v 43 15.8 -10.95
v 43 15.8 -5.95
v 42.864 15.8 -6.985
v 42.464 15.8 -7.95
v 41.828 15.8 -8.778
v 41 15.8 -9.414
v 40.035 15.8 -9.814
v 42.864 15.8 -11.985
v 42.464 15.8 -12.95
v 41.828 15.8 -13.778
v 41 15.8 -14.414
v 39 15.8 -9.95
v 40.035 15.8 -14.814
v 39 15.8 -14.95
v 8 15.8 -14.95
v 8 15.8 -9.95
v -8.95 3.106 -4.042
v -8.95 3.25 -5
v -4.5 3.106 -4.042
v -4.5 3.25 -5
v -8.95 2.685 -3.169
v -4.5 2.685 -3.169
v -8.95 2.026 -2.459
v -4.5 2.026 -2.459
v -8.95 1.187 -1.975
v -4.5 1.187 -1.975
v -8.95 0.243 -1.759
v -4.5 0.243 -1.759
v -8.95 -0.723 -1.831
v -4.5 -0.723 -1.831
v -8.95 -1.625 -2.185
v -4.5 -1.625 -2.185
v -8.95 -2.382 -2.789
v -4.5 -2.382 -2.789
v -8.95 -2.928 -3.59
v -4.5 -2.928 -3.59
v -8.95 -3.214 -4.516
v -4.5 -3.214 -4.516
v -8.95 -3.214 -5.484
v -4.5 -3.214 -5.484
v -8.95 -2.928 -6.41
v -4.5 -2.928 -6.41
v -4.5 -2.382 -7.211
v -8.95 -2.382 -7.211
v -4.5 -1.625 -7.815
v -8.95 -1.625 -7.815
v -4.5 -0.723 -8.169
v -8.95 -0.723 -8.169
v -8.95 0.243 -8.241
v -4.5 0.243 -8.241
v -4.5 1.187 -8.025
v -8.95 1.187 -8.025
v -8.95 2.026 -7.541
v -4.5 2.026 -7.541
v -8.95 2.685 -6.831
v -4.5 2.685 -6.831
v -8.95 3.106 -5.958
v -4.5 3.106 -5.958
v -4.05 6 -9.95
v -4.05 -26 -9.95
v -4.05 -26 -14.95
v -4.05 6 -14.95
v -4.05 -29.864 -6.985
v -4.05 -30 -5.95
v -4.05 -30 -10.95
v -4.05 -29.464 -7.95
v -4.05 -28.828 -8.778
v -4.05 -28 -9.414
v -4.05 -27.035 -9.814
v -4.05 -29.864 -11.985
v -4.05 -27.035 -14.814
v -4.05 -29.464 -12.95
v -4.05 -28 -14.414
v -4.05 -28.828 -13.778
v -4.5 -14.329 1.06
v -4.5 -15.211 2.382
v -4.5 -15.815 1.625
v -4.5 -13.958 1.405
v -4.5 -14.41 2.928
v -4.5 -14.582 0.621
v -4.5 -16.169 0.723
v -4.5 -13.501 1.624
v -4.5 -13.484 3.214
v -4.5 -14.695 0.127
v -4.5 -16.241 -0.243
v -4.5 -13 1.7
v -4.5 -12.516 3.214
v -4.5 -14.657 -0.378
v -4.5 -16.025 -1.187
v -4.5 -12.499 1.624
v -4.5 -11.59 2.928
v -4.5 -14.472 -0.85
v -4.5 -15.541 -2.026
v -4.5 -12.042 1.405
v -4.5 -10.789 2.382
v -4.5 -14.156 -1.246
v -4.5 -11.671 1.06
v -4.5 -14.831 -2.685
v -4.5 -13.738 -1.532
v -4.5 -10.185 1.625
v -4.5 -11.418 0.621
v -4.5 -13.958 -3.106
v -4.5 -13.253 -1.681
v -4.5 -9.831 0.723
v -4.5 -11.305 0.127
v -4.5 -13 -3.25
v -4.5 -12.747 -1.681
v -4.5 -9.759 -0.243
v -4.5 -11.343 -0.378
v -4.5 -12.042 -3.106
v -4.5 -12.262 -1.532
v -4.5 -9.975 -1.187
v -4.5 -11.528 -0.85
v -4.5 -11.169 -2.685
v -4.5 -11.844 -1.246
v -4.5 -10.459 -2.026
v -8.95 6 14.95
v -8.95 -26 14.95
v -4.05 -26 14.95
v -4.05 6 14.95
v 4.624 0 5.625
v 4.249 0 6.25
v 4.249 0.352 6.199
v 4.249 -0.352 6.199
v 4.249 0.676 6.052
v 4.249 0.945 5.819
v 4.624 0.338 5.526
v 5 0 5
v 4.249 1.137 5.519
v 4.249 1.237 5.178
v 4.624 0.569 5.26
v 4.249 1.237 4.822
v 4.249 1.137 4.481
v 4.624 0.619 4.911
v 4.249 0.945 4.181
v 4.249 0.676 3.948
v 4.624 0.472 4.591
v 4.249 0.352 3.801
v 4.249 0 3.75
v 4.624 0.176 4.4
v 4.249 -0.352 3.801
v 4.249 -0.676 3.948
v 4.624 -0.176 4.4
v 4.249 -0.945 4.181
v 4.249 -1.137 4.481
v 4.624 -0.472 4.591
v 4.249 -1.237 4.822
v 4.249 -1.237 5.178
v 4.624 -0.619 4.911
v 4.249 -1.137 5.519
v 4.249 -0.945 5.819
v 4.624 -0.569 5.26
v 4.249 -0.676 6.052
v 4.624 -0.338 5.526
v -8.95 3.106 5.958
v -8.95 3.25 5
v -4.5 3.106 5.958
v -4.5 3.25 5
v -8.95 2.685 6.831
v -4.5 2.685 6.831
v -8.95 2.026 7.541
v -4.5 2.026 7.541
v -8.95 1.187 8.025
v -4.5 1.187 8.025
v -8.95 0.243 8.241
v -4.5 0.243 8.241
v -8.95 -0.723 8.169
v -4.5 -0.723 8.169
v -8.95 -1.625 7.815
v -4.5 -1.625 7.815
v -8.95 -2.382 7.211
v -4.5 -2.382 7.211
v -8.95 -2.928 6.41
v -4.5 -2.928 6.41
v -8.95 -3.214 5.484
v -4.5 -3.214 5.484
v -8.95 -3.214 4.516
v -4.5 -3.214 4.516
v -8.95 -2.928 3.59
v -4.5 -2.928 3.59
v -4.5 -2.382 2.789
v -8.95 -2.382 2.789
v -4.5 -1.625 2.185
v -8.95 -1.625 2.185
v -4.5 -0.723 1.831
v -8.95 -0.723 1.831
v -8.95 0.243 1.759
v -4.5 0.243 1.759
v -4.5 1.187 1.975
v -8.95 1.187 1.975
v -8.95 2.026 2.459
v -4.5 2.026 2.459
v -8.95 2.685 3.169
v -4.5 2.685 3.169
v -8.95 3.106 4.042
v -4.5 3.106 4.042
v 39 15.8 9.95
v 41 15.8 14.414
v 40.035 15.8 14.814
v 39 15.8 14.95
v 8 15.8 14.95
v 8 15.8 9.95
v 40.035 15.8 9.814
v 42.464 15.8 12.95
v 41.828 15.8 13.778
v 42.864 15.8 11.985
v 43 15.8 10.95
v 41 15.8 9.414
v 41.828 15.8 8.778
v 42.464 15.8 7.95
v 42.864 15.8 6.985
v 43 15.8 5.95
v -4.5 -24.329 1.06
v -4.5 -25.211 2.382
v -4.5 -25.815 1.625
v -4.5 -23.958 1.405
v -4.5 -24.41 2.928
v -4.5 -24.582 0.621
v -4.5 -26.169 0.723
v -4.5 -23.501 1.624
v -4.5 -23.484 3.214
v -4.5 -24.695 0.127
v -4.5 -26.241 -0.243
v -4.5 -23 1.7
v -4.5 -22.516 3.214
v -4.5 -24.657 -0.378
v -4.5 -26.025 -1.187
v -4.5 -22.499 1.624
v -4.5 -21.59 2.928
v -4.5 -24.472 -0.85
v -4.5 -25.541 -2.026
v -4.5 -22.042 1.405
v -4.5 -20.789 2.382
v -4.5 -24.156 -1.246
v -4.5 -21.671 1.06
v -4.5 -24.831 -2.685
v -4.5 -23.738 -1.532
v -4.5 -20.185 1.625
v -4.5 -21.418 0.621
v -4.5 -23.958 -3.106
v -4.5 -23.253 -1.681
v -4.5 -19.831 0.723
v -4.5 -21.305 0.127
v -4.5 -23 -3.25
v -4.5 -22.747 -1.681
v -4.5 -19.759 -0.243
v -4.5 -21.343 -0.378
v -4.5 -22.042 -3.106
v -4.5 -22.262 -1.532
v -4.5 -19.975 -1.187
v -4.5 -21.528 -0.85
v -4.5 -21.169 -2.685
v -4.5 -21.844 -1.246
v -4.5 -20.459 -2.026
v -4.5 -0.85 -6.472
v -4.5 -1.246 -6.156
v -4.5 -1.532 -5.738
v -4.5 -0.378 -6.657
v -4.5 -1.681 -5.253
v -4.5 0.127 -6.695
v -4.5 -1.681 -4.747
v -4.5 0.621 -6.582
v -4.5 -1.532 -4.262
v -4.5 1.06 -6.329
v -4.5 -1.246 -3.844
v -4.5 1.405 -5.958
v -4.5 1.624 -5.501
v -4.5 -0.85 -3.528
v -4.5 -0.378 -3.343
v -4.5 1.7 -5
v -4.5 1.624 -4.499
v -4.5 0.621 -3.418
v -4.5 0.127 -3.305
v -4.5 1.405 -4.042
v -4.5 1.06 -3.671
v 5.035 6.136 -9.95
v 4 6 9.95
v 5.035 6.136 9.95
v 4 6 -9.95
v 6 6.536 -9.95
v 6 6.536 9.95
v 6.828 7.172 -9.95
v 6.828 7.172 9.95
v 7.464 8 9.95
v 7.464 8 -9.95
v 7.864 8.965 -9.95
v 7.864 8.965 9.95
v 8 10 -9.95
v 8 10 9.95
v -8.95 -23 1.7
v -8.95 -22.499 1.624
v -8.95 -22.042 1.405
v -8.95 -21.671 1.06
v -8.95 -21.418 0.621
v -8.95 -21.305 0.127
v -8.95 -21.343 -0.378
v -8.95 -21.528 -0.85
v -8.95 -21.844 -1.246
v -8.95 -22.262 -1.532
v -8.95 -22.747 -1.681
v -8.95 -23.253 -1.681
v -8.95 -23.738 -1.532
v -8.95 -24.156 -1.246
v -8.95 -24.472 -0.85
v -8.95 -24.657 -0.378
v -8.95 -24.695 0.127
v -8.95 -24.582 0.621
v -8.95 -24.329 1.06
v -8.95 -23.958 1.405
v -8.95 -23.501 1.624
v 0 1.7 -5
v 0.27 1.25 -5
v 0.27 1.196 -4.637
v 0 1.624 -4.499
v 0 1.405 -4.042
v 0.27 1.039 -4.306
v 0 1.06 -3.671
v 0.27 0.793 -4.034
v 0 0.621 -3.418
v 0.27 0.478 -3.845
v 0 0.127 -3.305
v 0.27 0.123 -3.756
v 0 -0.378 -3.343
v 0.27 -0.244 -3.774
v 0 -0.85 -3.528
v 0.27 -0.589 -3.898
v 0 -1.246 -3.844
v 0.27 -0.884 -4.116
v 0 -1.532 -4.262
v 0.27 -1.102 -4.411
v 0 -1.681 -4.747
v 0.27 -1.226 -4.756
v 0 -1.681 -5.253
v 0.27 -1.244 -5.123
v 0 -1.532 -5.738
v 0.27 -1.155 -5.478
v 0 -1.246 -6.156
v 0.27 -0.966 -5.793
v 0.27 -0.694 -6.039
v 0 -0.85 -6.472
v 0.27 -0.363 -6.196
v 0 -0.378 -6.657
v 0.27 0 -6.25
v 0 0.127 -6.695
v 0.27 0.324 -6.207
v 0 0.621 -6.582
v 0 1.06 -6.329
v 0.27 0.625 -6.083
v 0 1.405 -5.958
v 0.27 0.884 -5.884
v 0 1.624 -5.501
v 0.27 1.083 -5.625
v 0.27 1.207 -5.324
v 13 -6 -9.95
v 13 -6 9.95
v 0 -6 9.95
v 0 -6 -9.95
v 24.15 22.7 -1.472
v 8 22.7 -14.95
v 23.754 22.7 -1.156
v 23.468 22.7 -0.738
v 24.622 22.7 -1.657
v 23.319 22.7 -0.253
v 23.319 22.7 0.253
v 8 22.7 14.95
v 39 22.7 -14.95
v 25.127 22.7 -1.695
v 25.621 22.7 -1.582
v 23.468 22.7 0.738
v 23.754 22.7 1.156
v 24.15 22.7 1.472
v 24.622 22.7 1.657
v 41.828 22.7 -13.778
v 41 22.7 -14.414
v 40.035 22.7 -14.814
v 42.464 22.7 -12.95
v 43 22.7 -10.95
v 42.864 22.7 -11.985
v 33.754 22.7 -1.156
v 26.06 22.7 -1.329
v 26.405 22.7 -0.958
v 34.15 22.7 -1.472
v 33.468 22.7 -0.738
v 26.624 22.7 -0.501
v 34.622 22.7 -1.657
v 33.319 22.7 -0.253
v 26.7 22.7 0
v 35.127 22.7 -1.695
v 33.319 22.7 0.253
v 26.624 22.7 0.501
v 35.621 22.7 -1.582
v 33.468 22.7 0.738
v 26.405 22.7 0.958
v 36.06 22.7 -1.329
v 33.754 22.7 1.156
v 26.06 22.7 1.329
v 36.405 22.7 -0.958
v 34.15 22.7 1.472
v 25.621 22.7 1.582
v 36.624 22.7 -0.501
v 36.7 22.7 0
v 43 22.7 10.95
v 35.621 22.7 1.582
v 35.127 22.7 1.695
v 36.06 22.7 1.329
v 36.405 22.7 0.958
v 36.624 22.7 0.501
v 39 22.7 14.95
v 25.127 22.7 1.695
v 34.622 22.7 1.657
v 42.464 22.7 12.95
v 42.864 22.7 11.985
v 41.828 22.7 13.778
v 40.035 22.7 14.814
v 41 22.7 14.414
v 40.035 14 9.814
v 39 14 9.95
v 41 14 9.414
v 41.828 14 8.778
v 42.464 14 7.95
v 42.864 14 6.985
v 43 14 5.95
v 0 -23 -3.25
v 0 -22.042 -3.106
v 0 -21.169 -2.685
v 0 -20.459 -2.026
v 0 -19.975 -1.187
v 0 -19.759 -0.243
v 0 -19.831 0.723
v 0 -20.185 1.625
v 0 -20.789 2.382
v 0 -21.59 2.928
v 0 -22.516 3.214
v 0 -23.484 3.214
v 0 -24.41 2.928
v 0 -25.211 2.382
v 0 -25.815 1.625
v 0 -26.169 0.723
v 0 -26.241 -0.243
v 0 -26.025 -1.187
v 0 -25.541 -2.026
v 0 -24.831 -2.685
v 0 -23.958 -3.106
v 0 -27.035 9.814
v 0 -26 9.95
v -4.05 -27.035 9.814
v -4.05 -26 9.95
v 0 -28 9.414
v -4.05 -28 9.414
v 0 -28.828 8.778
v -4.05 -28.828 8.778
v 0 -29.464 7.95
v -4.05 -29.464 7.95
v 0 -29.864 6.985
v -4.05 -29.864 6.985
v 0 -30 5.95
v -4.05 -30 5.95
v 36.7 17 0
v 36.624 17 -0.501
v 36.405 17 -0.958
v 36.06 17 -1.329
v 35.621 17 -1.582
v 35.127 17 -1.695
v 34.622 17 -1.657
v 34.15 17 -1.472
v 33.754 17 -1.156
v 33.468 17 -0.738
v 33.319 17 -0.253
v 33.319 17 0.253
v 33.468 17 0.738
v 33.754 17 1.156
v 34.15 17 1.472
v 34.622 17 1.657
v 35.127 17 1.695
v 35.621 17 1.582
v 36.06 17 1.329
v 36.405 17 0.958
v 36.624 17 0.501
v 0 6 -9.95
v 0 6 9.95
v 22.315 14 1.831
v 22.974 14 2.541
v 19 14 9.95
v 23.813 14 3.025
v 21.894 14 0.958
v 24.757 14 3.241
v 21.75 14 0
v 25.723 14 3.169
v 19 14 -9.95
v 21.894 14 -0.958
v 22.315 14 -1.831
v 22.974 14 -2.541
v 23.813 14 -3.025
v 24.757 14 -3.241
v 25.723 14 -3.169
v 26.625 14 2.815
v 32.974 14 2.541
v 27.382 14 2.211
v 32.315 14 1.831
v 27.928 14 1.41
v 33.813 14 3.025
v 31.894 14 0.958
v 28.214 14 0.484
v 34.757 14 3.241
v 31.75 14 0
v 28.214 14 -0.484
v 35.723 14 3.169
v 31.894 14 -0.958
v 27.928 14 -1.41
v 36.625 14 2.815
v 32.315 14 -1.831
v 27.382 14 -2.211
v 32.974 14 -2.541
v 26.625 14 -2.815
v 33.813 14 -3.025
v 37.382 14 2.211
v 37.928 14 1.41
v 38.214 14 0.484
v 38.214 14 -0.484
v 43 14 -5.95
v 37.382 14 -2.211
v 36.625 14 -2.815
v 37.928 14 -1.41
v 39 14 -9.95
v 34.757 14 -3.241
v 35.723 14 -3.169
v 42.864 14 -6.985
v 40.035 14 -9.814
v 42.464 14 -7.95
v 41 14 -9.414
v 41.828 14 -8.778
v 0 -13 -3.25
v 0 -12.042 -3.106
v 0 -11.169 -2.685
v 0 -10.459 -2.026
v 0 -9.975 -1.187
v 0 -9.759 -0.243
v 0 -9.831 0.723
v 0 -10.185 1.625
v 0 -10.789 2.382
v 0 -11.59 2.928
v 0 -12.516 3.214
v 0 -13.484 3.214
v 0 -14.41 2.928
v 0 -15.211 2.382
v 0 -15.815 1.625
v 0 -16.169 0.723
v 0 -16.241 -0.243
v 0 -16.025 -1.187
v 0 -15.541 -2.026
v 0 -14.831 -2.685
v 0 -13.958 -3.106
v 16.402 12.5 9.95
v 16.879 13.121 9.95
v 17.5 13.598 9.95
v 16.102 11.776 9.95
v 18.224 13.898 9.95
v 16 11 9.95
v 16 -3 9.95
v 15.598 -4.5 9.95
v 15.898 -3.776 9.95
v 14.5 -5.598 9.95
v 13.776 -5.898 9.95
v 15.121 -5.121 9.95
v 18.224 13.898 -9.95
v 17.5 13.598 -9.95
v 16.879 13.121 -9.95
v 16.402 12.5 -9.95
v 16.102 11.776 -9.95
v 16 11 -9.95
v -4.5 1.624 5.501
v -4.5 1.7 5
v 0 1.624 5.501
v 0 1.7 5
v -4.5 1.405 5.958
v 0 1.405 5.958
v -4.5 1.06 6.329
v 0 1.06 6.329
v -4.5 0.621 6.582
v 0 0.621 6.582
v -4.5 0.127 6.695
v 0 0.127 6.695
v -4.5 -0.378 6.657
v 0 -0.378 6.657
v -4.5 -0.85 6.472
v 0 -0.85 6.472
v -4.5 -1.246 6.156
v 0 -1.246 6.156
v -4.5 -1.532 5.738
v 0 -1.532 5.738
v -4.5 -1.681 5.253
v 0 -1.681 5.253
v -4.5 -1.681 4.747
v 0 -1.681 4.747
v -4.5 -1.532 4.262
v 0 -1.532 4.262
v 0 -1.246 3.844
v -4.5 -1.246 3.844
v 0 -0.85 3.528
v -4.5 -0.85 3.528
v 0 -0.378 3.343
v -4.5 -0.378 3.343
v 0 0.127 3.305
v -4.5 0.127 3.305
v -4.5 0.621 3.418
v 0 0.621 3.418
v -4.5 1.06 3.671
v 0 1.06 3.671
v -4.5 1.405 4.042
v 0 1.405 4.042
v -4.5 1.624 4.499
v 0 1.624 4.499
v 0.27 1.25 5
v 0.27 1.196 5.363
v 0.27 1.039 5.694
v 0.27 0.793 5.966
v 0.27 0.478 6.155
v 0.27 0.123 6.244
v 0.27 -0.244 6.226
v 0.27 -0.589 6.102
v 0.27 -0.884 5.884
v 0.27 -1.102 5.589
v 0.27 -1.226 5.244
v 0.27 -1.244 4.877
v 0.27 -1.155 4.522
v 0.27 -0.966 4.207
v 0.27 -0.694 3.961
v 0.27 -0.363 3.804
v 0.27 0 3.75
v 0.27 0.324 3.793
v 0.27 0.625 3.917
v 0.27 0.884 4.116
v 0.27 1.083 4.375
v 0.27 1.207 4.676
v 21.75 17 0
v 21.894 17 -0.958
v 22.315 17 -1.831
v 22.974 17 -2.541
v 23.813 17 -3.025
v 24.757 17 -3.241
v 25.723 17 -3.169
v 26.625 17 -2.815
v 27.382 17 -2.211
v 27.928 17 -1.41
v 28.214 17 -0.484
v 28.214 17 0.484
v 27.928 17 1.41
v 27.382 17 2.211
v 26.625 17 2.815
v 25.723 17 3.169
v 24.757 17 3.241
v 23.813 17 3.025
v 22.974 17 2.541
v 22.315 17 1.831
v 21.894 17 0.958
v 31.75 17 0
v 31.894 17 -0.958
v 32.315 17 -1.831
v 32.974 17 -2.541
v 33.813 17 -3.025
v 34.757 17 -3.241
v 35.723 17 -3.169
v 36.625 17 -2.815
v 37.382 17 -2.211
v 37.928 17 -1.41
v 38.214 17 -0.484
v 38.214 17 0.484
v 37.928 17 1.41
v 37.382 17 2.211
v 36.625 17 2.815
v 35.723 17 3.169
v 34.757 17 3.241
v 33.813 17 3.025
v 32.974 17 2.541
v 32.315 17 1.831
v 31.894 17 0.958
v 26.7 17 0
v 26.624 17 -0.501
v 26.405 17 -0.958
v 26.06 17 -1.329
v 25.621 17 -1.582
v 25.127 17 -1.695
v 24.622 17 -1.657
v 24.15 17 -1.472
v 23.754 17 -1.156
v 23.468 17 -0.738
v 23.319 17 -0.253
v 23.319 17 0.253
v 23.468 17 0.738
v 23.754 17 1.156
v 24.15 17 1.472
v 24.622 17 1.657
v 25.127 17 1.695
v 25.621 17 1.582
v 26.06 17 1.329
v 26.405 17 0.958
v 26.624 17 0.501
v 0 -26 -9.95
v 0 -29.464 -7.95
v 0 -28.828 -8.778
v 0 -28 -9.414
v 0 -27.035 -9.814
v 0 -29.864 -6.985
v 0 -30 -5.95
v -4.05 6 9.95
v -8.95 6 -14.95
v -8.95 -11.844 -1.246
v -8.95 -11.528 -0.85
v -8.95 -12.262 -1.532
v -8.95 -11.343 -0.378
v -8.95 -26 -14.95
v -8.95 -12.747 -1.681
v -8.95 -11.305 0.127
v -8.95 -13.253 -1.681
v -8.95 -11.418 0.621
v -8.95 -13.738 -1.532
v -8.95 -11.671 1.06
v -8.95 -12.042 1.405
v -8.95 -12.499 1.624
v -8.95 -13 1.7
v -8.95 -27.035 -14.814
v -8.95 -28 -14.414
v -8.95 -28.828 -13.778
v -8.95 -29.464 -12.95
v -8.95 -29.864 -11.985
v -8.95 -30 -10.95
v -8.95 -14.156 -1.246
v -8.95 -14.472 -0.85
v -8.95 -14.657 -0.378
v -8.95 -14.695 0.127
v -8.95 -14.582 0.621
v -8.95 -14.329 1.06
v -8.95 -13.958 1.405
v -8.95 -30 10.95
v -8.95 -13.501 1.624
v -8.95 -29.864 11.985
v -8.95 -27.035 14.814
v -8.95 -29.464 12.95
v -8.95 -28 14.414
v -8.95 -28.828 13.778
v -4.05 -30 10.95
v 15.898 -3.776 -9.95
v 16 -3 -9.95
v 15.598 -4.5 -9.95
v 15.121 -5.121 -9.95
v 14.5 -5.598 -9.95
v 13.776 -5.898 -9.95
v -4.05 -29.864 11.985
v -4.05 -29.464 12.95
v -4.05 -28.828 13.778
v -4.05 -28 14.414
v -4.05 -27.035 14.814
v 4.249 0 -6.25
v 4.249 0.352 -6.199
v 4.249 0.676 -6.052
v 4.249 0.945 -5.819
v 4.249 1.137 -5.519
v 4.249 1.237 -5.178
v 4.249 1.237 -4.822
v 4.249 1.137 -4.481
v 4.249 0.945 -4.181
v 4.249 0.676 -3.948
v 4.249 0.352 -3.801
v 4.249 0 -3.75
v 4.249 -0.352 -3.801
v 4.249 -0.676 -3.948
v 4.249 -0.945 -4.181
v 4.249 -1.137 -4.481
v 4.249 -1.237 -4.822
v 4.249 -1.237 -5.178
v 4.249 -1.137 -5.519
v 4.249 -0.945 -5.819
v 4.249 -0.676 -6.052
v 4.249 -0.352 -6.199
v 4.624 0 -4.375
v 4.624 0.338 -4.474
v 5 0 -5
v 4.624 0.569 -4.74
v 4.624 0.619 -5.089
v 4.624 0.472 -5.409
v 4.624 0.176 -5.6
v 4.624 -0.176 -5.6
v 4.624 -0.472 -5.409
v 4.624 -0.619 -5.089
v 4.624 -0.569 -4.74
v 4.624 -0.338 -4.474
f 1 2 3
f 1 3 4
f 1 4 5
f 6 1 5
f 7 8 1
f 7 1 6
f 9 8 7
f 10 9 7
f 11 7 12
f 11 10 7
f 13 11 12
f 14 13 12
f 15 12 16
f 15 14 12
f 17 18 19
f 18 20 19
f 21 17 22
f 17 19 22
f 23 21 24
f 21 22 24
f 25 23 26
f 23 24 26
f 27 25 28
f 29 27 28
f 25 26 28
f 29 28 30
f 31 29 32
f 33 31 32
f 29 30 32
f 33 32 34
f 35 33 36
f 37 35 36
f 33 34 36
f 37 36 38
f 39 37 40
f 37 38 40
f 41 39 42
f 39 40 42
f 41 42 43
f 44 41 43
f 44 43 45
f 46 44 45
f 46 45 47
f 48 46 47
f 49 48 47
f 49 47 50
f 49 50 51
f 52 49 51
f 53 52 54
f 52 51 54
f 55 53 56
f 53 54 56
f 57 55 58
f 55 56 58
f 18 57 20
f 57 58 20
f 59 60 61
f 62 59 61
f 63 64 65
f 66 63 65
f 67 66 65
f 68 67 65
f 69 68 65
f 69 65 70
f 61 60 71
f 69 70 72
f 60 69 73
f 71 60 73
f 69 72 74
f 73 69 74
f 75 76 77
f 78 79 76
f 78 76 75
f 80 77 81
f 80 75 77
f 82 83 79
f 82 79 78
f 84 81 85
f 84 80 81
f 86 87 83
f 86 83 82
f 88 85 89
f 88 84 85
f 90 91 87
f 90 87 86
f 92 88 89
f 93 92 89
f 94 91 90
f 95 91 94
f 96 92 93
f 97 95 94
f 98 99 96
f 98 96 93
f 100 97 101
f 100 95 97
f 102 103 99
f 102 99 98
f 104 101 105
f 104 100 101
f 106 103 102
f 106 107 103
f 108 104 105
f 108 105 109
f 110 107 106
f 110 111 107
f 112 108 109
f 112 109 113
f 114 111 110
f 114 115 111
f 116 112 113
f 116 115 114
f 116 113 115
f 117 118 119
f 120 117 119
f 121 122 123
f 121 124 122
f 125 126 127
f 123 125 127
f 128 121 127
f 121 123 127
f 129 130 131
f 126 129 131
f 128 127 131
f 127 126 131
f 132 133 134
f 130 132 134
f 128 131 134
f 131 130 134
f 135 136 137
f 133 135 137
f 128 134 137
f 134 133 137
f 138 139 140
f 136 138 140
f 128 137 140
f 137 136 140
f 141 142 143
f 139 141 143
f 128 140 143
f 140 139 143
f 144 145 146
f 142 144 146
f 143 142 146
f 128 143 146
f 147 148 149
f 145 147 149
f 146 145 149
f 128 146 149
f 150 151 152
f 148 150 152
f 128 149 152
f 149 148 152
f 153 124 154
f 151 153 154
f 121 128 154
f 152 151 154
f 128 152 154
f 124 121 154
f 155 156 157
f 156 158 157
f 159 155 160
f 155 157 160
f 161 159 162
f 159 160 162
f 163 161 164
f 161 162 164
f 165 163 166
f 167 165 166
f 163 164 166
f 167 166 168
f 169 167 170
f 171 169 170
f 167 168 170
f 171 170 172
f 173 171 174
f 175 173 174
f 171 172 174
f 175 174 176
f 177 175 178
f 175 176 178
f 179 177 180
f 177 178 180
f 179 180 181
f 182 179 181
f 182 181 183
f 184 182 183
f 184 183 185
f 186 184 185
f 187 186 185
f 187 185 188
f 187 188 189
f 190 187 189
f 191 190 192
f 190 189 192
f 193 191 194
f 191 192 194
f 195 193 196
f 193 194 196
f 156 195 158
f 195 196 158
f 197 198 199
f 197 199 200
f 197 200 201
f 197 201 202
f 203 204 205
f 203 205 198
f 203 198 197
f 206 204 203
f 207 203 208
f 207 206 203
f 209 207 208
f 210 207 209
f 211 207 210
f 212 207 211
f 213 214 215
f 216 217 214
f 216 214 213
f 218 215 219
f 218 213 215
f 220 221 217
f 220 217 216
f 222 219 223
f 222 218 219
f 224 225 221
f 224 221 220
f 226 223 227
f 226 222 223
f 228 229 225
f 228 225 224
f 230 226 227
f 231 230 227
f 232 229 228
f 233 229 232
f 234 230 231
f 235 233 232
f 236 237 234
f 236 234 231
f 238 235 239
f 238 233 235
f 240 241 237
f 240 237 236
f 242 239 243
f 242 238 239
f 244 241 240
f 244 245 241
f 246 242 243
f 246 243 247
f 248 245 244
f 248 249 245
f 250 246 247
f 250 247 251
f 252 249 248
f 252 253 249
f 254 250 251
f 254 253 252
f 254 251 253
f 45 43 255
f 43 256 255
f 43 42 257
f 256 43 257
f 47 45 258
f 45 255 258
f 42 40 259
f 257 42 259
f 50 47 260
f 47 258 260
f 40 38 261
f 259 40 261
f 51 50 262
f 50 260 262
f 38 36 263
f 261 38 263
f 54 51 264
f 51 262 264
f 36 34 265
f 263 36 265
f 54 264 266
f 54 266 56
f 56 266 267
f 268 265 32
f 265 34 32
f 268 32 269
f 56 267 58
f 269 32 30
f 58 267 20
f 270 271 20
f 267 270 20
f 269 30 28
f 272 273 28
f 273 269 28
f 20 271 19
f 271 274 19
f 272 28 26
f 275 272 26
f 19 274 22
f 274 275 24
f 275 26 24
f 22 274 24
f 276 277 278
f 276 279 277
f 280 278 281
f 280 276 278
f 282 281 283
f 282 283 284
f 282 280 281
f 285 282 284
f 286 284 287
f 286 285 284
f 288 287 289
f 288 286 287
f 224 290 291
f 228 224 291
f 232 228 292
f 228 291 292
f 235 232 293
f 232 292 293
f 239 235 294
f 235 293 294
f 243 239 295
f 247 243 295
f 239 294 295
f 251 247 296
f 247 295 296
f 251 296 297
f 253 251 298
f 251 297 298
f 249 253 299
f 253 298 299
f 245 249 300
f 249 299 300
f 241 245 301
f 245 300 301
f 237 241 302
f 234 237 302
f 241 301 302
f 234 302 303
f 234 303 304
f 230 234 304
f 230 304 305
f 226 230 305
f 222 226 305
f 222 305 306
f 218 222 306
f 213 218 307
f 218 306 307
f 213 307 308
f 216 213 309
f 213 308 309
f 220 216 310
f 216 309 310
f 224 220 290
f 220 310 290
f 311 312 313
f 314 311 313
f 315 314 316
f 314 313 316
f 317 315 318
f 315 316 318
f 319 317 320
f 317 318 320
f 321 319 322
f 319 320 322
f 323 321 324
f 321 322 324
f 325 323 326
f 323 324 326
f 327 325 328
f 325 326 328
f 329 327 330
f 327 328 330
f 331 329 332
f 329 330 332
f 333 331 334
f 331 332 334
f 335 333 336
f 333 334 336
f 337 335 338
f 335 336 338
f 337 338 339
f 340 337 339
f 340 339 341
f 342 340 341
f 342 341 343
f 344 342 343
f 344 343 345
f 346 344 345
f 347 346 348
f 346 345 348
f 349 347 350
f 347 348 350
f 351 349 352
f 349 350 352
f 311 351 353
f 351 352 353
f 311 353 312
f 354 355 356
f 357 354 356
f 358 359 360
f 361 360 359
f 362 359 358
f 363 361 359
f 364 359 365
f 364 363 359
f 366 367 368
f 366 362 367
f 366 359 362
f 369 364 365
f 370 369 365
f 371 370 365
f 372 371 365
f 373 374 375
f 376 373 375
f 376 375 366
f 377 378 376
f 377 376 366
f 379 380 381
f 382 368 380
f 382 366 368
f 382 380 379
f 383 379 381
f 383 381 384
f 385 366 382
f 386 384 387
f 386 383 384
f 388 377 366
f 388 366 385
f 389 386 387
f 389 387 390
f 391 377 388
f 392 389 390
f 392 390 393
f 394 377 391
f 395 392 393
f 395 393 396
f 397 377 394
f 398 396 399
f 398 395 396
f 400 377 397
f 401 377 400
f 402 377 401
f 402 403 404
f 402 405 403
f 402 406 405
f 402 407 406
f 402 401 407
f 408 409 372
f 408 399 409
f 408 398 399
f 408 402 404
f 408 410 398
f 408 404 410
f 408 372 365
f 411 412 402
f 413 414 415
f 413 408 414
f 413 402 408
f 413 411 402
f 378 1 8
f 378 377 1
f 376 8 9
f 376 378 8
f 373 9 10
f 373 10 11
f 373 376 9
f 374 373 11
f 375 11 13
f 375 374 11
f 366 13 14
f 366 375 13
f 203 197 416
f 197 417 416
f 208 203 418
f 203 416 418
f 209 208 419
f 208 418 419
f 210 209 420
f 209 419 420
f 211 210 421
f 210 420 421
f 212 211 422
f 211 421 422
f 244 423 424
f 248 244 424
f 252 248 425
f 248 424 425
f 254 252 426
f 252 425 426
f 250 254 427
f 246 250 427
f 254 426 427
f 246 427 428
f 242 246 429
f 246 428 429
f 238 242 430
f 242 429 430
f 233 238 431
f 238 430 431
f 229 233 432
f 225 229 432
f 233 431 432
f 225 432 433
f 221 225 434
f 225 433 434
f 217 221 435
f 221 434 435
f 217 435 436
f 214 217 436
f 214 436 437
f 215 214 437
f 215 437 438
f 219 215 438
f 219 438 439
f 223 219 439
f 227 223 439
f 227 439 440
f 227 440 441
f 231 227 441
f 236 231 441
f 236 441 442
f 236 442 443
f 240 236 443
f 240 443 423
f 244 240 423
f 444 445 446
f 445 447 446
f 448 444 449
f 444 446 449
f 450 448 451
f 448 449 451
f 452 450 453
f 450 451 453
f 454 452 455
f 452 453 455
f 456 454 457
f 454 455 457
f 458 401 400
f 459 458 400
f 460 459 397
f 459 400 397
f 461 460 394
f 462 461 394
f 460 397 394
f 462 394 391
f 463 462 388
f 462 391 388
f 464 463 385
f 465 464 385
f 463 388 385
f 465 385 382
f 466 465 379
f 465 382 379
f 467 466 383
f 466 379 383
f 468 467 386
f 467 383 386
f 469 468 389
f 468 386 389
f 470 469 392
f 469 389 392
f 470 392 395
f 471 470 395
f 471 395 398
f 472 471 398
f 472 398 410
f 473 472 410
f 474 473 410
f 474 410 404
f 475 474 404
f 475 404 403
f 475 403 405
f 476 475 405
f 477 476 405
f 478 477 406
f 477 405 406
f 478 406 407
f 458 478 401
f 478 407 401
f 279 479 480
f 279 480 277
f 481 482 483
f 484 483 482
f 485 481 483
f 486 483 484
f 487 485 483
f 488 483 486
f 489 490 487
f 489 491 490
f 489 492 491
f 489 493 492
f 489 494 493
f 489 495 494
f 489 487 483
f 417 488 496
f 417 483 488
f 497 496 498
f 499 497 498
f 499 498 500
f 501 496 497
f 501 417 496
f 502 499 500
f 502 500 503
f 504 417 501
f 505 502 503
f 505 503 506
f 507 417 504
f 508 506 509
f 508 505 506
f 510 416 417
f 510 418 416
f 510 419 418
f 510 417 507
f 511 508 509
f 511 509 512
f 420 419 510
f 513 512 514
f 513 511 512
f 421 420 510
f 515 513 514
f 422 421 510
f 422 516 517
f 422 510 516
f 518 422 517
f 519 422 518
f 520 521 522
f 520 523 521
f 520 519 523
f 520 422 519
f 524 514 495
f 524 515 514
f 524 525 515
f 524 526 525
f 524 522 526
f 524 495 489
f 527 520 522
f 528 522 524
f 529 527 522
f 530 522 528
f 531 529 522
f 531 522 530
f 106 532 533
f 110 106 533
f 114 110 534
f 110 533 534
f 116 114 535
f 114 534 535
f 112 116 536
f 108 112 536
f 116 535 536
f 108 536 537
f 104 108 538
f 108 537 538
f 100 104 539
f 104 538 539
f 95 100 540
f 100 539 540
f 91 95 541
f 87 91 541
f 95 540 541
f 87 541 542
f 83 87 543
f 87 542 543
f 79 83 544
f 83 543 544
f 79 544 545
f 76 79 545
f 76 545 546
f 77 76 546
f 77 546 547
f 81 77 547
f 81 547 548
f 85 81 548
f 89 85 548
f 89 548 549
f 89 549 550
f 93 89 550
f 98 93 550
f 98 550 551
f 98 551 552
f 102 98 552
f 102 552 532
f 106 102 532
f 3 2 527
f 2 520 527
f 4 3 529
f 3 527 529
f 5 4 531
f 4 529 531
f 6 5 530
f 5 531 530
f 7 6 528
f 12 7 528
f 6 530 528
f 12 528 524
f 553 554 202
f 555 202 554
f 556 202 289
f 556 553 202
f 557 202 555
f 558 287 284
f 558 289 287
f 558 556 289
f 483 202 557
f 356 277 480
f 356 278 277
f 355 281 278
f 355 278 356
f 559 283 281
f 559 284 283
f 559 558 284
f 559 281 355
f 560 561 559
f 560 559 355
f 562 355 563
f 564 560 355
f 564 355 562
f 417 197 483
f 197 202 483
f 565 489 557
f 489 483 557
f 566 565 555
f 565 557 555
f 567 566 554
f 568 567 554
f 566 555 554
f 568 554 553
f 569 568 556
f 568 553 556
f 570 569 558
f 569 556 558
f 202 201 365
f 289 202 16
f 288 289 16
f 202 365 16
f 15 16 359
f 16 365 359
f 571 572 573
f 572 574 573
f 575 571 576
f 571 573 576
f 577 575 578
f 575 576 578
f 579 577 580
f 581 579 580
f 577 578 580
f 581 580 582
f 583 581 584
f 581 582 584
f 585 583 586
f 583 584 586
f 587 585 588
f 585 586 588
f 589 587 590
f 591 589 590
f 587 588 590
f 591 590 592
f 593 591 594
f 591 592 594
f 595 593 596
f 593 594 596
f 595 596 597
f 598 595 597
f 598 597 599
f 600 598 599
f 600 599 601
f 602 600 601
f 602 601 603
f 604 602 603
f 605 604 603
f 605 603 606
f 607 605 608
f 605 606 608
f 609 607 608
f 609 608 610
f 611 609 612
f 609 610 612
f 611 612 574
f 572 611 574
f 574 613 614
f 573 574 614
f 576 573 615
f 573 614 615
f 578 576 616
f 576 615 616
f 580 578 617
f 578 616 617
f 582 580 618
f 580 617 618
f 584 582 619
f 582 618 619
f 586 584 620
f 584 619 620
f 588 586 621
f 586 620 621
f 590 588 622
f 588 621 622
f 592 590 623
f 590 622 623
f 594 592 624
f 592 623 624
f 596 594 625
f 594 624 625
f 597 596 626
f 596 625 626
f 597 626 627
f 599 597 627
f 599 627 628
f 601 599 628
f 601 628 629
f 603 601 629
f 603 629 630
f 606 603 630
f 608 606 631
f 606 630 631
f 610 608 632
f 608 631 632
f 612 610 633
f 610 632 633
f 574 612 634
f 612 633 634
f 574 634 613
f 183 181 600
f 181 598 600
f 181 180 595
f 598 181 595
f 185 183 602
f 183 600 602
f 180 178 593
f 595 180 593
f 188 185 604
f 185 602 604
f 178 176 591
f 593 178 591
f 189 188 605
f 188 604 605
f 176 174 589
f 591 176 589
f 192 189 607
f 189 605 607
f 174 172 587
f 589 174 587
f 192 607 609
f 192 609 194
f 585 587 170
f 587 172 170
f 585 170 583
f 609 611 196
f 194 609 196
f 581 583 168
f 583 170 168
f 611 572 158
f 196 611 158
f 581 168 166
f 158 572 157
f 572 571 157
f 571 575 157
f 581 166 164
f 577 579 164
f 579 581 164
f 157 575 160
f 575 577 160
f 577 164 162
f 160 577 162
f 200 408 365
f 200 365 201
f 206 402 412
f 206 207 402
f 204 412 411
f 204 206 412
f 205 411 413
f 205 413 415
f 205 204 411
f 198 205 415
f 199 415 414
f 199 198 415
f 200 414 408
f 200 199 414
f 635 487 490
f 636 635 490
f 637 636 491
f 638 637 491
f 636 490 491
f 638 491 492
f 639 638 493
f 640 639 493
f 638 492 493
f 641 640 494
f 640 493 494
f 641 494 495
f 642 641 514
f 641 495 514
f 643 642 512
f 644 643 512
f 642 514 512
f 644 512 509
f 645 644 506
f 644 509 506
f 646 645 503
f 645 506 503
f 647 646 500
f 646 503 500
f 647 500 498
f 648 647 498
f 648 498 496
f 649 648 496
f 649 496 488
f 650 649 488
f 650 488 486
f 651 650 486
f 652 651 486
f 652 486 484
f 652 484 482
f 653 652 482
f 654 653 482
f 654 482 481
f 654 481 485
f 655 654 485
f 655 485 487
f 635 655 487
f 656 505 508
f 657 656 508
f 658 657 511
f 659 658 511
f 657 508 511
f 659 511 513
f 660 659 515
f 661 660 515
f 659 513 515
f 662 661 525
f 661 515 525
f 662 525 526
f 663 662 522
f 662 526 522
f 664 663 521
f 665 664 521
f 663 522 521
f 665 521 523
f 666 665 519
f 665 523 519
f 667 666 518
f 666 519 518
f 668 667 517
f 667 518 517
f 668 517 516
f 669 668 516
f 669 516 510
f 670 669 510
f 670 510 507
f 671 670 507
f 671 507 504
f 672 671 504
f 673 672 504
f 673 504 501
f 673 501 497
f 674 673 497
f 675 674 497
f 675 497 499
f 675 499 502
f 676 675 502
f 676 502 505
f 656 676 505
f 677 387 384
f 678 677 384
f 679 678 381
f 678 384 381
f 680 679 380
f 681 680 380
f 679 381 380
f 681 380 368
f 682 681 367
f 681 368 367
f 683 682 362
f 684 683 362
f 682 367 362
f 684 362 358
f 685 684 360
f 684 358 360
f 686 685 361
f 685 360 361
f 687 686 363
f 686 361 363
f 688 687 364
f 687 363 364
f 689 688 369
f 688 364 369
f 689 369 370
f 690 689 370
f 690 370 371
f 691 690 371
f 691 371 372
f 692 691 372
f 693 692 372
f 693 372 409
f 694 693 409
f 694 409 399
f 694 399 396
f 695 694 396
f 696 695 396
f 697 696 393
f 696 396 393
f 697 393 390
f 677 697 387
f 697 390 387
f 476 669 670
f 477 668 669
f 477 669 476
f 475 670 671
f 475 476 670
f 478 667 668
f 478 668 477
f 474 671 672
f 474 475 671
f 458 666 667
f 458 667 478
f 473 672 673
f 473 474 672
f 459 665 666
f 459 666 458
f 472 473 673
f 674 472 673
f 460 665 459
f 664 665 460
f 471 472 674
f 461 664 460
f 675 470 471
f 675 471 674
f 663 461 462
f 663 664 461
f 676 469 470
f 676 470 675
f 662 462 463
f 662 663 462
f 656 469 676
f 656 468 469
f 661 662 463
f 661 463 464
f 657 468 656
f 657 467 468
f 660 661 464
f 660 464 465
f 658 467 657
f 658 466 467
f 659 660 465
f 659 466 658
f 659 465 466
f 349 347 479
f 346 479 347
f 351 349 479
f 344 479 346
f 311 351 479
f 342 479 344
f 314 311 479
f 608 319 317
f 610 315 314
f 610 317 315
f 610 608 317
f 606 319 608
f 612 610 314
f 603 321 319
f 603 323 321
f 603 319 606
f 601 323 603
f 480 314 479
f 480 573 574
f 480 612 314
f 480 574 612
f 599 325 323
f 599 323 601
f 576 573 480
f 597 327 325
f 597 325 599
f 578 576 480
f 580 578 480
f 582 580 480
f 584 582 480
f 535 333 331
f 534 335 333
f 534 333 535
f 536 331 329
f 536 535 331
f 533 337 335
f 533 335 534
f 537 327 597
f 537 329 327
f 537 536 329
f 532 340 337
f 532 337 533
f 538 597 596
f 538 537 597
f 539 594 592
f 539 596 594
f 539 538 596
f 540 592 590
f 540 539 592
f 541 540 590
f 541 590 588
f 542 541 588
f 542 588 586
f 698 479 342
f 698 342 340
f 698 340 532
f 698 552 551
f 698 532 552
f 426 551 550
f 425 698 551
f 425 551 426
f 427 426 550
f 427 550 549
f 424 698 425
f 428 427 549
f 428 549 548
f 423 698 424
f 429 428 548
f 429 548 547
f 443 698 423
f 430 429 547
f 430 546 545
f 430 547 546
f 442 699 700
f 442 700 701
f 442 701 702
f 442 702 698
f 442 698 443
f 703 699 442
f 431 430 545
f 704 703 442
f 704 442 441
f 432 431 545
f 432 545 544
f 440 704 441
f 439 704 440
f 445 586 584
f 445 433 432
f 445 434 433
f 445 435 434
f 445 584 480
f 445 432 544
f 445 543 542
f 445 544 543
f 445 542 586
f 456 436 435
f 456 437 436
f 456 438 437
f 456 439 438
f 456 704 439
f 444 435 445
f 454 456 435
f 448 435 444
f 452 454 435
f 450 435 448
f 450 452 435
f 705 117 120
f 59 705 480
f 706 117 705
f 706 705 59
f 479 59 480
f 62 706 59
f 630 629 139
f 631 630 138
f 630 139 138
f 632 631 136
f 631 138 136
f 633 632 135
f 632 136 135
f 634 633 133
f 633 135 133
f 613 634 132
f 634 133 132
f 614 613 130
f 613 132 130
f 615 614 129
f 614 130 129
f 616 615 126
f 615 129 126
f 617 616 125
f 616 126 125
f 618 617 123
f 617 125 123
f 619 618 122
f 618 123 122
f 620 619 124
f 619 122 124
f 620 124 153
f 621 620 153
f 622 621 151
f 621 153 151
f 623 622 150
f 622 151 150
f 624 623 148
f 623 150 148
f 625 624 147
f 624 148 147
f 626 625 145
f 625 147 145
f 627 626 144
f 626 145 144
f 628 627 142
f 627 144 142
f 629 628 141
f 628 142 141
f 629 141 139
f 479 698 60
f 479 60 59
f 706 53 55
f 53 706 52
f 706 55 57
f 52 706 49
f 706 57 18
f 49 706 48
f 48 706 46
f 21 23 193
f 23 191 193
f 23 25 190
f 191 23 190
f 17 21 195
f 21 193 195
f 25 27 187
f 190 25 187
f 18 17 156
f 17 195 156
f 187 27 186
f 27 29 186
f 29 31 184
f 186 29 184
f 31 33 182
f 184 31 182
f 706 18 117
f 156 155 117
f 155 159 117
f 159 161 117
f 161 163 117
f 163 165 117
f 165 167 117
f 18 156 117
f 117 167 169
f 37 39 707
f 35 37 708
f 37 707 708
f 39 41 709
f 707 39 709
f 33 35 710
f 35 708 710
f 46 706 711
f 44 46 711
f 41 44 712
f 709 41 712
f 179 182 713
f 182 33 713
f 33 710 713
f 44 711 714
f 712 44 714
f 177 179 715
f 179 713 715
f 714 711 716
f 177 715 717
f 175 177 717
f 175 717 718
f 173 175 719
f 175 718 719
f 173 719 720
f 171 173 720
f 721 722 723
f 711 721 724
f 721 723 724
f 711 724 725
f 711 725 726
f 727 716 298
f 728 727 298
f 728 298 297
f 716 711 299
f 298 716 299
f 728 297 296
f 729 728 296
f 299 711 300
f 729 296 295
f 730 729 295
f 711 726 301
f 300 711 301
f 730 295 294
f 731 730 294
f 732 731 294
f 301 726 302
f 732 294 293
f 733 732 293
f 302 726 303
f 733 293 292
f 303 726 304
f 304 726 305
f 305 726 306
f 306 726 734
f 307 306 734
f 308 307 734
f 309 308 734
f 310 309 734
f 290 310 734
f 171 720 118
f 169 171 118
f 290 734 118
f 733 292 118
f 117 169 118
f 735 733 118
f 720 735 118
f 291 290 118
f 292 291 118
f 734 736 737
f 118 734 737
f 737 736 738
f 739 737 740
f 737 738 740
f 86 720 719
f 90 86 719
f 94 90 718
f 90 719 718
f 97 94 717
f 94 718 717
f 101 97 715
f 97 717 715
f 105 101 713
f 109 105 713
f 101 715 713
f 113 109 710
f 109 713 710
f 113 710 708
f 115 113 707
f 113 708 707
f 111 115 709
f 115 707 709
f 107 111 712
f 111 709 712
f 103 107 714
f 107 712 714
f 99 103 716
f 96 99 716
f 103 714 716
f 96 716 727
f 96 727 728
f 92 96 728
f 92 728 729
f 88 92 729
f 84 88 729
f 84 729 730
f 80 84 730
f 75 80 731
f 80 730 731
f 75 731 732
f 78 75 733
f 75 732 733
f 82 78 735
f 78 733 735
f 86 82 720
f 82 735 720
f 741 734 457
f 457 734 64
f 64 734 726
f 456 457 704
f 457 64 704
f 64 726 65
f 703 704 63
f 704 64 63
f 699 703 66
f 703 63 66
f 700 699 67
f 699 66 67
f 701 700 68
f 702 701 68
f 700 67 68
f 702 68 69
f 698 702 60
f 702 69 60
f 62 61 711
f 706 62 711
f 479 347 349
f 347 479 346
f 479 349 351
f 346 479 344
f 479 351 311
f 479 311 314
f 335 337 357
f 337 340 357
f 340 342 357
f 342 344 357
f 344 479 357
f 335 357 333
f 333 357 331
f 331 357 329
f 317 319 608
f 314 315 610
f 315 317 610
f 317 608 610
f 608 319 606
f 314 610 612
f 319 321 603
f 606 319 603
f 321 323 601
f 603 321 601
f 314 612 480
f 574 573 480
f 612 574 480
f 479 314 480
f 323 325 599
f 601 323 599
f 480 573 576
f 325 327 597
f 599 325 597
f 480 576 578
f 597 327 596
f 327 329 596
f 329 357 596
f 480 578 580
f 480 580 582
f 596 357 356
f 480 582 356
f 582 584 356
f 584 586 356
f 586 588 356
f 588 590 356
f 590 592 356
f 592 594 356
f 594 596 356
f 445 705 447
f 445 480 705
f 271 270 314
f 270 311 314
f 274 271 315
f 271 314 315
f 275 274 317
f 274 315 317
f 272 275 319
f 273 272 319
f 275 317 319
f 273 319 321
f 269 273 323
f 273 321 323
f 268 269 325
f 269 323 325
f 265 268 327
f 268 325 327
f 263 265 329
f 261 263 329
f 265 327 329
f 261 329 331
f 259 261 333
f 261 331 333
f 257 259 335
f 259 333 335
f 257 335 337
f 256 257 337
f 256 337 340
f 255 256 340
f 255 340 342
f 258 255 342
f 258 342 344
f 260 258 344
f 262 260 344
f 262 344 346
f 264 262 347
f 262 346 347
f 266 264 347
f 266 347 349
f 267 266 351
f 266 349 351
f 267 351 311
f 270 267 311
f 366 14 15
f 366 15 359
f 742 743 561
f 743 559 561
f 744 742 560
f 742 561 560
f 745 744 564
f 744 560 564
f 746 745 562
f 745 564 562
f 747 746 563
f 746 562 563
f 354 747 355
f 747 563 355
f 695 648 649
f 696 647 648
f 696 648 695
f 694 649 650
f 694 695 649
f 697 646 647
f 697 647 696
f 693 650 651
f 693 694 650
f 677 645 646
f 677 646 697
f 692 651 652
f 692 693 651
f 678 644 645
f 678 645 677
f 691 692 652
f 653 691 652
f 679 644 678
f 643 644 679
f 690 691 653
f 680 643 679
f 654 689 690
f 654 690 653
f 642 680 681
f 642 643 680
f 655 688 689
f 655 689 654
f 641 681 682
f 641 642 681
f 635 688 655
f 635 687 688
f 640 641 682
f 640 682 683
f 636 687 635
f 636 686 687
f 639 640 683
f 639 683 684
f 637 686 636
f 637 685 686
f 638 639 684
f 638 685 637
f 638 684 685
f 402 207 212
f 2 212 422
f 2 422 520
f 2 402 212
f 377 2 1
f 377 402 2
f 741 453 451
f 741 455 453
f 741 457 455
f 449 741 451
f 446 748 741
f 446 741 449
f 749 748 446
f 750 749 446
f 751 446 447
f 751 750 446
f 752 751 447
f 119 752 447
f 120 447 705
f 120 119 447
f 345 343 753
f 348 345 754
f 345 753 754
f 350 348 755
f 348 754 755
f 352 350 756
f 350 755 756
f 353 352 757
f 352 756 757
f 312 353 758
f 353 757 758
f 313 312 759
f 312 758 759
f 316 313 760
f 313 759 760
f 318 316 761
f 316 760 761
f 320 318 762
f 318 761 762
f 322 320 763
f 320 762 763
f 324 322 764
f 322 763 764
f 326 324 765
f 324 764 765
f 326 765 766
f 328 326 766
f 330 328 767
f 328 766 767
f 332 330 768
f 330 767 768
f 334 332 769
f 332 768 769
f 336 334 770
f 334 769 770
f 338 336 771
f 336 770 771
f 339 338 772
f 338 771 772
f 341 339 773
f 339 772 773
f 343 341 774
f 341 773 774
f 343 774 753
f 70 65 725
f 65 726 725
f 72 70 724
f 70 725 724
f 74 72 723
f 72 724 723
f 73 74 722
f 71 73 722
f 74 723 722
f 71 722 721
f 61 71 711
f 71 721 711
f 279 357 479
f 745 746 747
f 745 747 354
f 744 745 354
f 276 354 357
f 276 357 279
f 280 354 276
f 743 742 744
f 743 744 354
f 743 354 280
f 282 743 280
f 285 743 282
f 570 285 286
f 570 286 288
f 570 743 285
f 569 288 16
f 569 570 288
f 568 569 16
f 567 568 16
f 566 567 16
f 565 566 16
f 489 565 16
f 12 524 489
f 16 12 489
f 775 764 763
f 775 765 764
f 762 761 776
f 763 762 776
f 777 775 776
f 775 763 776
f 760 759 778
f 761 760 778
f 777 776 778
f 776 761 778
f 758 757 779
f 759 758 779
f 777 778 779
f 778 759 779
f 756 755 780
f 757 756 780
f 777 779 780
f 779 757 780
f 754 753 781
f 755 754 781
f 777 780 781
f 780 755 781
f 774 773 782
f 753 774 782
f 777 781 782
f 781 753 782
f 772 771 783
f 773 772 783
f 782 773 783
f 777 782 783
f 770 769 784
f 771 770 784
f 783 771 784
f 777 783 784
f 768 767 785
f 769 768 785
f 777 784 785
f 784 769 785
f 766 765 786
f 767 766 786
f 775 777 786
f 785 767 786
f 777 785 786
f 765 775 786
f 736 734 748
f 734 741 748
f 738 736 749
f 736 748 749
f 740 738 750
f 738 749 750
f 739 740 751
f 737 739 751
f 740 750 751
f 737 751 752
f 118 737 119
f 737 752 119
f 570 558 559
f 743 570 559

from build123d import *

# Parameters (mm, degrees)
BOSS_EXTRUDE1_DEPTH             = 10
BOSS_EXTRUDE2_DEPTH             = 6
BOSS_EXTRUDE2_DEPTH_BACK        = 30
BOSS_EXTRUDE4_START             = -35
BOSS_EXTRUDE4_DEPTH             = 35
CBORE_FOR_M3_SHCS10_D           = 3.4
CBORE_FOR_M3_SHCS10_CBORE_D     = 6.5
CBORE_FOR_M3_SHCS10_CBORE_DEPTH = 3
CBORE_FOR_M3_SHCS11_D           = 3.4
CBORE_FOR_M3_SHCS11_CBORE_D     = 6.5
CBORE_FOR_M3_SHCS11_CBORE_DEPTH = 4.5
M3X0_5_TAPPED_HOLE1_D           = 2.5
M3X0_5_TAPPED_HOLE1_DEPTH       = 13.248924226
M3X0_5_TAPPED_HOLE1_TIP         = 0.751075774
TOLERANCING_BY                  = 0.05
TOLERANCING_2_BY                = 0.05
TOLERANCING_3_BY                = 0.05
TOLERANCING_4_BY                = 0.05
TOLERANCING_5_BY                = 0.05
TOLERANCING_6_BY                = 0.05
TOLERANCING_7_BY                = 0.05
TOLERANCING_8_BY                = 0.05
TOLERANCING_9_BY                = 0.05
TOLERANCING_10_BY               = 0.05
TOLERANCING_11_BY               = 0.05
TOLERANCING_12_BY               = 0.05
FILLET2_R                       = 3
FILLET3_R                       = 4
FILLET4_R                       = 4


# Read off the part's stored shape, not the designer's step: CBORE for M3 SHCS12
with BuildPart() as part:
    # Sketch1 → Boss-Extrude1 (new, symmetric)
    with BuildSketch(Plane.XY):
        Polygon((16, -6), (0, -6), (0, 6), (8, 6), (8, 14), (16, 14), align=None)
    extrude(amount=BOSS_EXTRUDE1_DEPTH, both=True)

    # Sketch2 → Boss-Extrude2 (add, two sides: drawn at the far end of the back side and taken through both)
    with BuildSketch(Plane(origin=(0, 0, 0), x_dir=(1, 0, 0), z_dir=(0, 1, 0)).offset(-BOSS_EXTRUDE2_DEPTH_BACK)):
        Polygon((-4, 15), (-9, 15), (-9, -15), (-4, -15), (-4, -10), (0, -10), (0, 10), (-4, 10), align=None)
    extrude(amount=BOSS_EXTRUDE2_DEPTH + BOSS_EXTRUDE2_DEPTH_BACK)

    # Sketch7 → Boss-Extrude4 (add)
    with BuildSketch(Plane.ZY.offset(-8).offset(BOSS_EXTRUDE4_START)):
        Polygon((-10, 14), (-10, 15.75), (-15, 15.75), (-15, 22.75), (15, 22.75), (15, 15.75), (10, 15.75), (10, 14), align=None)
    extrude(amount=BOSS_EXTRUDE4_DEPTH)

    # CBORE for M3 SHCS10 (through all)
    with Locations(Plane(origin=(0, 14, 0), x_dir=(-1, 0, 0), z_dir=(0, -1, 0))):
        with Locations((-25, 0), (-35, 0)):
            CounterBoreHole(CBORE_FOR_M3_SHCS10_D / 2, CBORE_FOR_M3_SHCS10_CBORE_D / 2, CBORE_FOR_M3_SHCS10_CBORE_DEPTH)

    # CBORE for M3 SHCS11 (through all)
    with Locations(Plane(origin=(0, 0, 0), x_dir=(0, 0, -1), z_dir=(1, 0, 0))):
        with Locations((0, -13), (0, -23)):
            CounterBoreHole(CBORE_FOR_M3_SHCS11_D / 2, CBORE_FOR_M3_SHCS11_CBORE_D / 2, CBORE_FOR_M3_SHCS11_CBORE_DEPTH)

    # M3x0.5 Tapped Hole1
    with Locations(Plane.ZY.offset(9)):
        with Locations((-5, 0), (5, 0)):
            Hole(M3X0_5_TAPPED_HOLE1_D / 2, depth=M3X0_5_TAPPED_HOLE1_DEPTH)
            with Locations((0, 0, -(M3X0_5_TAPPED_HOLE1_DEPTH + M3X0_5_TAPPED_HOLE1_TIP / 2))):  # 118° drill point
                Cone(0, M3X0_5_TAPPED_HOLE1_D / 2, M3X0_5_TAPPED_HOLE1_TIP, mode=Mode.SUBTRACT)

    # CBORE for M3 SHCS12 outline → CBORE for M3 SHCS12 (revolve, cut)
    with BuildSketch(Plane.YX.offset(-5)):
        Polygon((1.7, 0), (1.25, 0.270387279), (1.25, -9), (3.25, -9), (3.25, -4.5), (1.7, -4.5), align=None)
    revolve(axis=Axis((0, 0, 5), (1, 0, 0)), mode=Mode.SUBTRACT)

    # CBORE for M3 SHCS12 2 outline → CBORE for M3 SHCS12 2 (revolve, cut)
    with BuildSketch(Plane.YX.offset(5)):
        Polygon((1.25, -9), (3.25, -9), (3.25, -4.5), (1.7, -4.5), (1.7, 0), (1.25, 0.270387279), align=None)
    revolve(axis=Axis((0, 0, -5), (1, 0, 0)), mode=Mode.SUBTRACT)

    # Tolerancing: a face moved inward by 0.05
    extrude(part.faces().sort_by_distance((-4, -12, 12.5))[0], amount=TOLERANCING_BY, dir=(-1, 0, 0), mode=Mode.SUBTRACT)

    # Tolerancing 2: a face moved inward by 0.05
    extrude(part.faces().sort_by_distance((16.75, 22.75, 0))[0], amount=TOLERANCING_2_BY, dir=(0, -1, 0), mode=Mode.SUBTRACT)

    # Tolerancing 3: a face moved inward by 0.05
    extrude(part.faces().sort_by_distance((25.5, 15.75, 12.5))[0], amount=TOLERANCING_3_BY, dir=(0, 1, 0), mode=Mode.SUBTRACT)

    # Tolerancing 4: a face moved inward by 0.05
    extrude(part.faces().sort_by_distance((25.5, 19.25, 15))[0], amount=TOLERANCING_4_BY, dir=(0, 0, -1), mode=Mode.SUBTRACT)

    # Tolerancing 5: a face moved inward by 0.05
    extrude(part.faces().sort_by_distance((25.5, 19.25, -15))[0], amount=TOLERANCING_5_BY, dir=(0, 0, 1), mode=Mode.SUBTRACT)

    # Tolerancing 6: a face moved inward by 0.05
    extrude(part.faces().sort_by_distance((25.5, 15.75, -12.5))[0], amount=TOLERANCING_6_BY, dir=(0, 1, 0), mode=Mode.SUBTRACT)

    # Tolerancing 7: a face moved inward by 0.05
    extrude(part.faces().sort_by_distance((7.756910569, -0.383536585, 10))[0], amount=TOLERANCING_7_BY, dir=(0, 0, -1), mode=Mode.SUBTRACT)

    # Tolerancing 8: a face moved inward by 0.05
    extrude(part.faces().sort_by_distance((-6.5, -12, 15))[0], amount=TOLERANCING_8_BY, dir=(0, 0, -1), mode=Mode.SUBTRACT)

    # Tolerancing 9: a face moved inward by 0.05
    extrude(part.faces().sort_by_distance((-9, -3, 0))[0], amount=TOLERANCING_9_BY, dir=(1, 0, 0), mode=Mode.SUBTRACT)

    # Tolerancing 10: a face moved inward by 0.05
    extrude(part.faces().sort_by_distance((-6.5, -12, -15))[0], amount=TOLERANCING_10_BY, dir=(0, 0, 1), mode=Mode.SUBTRACT)

    # Tolerancing 11: a face moved inward by 0.05
    extrude(part.faces().sort_by_distance((-4, -12, -12.5))[0], amount=TOLERANCING_11_BY, dir=(-1, 0, 0), mode=Mode.SUBTRACT)

    # Tolerancing 12: a face moved inward by 0.05
    extrude(part.faces().sort_by_distance((7.756910569, -0.383536585, -10))[0], amount=TOLERANCING_12_BY, dir=(0, 0, 1), mode=Mode.SUBTRACT)

    # Fillet2
    fillet2_edges = [part.edges().sort_by_distance(p)[0] for p in [
        (16, -6, 0),
        (16, 14, 0),
    ]]
    fillet(fillet2_edges, radius=FILLET2_R)

    # Fillet3
    fillet3_edges = [part.edges().sort_by_distance(p)[0] for p in [
        (8, 6, 0),
    ]]
    fillet(fillet3_edges, radius=FILLET3_R)

    # Fillet4
    fillet4_edges = [part.edges().sort_by_distance(p)[0] for p in [
        (-2.025, -30, -9.95),
        (-2.025, -30, 9.95),
        (-6.5, -30, 14.95),
        (-6.5, -30, -14.95),
        (43, 14.9, -9.95),
        (43, 19.25, -14.95),
        (43, 19.25, 14.95),
        (43, 14.9, 9.95),
    ]]
    fillet(fillet4_edges, radius=FILLET4_R)


with BuildPart() as body_2:
    # Split1: the piece on the far side of the plane
    add(part.part)
    split(bisect_by=Plane(origin=(0, 0, 0), x_dir=(0, 0, 1), z_dir=(1, 0, 0)), keep=Keep.BOTTOM)


with BuildPart() as part_1:
    add(part.part)

    # Split1
    split(bisect_by=Plane(origin=(0, 0, 0), x_dir=(0, 0, 1), z_dir=(1, 0, 0)), keep=Keep.TOP)


solid = Compound([body_2.part, part_1.part])
